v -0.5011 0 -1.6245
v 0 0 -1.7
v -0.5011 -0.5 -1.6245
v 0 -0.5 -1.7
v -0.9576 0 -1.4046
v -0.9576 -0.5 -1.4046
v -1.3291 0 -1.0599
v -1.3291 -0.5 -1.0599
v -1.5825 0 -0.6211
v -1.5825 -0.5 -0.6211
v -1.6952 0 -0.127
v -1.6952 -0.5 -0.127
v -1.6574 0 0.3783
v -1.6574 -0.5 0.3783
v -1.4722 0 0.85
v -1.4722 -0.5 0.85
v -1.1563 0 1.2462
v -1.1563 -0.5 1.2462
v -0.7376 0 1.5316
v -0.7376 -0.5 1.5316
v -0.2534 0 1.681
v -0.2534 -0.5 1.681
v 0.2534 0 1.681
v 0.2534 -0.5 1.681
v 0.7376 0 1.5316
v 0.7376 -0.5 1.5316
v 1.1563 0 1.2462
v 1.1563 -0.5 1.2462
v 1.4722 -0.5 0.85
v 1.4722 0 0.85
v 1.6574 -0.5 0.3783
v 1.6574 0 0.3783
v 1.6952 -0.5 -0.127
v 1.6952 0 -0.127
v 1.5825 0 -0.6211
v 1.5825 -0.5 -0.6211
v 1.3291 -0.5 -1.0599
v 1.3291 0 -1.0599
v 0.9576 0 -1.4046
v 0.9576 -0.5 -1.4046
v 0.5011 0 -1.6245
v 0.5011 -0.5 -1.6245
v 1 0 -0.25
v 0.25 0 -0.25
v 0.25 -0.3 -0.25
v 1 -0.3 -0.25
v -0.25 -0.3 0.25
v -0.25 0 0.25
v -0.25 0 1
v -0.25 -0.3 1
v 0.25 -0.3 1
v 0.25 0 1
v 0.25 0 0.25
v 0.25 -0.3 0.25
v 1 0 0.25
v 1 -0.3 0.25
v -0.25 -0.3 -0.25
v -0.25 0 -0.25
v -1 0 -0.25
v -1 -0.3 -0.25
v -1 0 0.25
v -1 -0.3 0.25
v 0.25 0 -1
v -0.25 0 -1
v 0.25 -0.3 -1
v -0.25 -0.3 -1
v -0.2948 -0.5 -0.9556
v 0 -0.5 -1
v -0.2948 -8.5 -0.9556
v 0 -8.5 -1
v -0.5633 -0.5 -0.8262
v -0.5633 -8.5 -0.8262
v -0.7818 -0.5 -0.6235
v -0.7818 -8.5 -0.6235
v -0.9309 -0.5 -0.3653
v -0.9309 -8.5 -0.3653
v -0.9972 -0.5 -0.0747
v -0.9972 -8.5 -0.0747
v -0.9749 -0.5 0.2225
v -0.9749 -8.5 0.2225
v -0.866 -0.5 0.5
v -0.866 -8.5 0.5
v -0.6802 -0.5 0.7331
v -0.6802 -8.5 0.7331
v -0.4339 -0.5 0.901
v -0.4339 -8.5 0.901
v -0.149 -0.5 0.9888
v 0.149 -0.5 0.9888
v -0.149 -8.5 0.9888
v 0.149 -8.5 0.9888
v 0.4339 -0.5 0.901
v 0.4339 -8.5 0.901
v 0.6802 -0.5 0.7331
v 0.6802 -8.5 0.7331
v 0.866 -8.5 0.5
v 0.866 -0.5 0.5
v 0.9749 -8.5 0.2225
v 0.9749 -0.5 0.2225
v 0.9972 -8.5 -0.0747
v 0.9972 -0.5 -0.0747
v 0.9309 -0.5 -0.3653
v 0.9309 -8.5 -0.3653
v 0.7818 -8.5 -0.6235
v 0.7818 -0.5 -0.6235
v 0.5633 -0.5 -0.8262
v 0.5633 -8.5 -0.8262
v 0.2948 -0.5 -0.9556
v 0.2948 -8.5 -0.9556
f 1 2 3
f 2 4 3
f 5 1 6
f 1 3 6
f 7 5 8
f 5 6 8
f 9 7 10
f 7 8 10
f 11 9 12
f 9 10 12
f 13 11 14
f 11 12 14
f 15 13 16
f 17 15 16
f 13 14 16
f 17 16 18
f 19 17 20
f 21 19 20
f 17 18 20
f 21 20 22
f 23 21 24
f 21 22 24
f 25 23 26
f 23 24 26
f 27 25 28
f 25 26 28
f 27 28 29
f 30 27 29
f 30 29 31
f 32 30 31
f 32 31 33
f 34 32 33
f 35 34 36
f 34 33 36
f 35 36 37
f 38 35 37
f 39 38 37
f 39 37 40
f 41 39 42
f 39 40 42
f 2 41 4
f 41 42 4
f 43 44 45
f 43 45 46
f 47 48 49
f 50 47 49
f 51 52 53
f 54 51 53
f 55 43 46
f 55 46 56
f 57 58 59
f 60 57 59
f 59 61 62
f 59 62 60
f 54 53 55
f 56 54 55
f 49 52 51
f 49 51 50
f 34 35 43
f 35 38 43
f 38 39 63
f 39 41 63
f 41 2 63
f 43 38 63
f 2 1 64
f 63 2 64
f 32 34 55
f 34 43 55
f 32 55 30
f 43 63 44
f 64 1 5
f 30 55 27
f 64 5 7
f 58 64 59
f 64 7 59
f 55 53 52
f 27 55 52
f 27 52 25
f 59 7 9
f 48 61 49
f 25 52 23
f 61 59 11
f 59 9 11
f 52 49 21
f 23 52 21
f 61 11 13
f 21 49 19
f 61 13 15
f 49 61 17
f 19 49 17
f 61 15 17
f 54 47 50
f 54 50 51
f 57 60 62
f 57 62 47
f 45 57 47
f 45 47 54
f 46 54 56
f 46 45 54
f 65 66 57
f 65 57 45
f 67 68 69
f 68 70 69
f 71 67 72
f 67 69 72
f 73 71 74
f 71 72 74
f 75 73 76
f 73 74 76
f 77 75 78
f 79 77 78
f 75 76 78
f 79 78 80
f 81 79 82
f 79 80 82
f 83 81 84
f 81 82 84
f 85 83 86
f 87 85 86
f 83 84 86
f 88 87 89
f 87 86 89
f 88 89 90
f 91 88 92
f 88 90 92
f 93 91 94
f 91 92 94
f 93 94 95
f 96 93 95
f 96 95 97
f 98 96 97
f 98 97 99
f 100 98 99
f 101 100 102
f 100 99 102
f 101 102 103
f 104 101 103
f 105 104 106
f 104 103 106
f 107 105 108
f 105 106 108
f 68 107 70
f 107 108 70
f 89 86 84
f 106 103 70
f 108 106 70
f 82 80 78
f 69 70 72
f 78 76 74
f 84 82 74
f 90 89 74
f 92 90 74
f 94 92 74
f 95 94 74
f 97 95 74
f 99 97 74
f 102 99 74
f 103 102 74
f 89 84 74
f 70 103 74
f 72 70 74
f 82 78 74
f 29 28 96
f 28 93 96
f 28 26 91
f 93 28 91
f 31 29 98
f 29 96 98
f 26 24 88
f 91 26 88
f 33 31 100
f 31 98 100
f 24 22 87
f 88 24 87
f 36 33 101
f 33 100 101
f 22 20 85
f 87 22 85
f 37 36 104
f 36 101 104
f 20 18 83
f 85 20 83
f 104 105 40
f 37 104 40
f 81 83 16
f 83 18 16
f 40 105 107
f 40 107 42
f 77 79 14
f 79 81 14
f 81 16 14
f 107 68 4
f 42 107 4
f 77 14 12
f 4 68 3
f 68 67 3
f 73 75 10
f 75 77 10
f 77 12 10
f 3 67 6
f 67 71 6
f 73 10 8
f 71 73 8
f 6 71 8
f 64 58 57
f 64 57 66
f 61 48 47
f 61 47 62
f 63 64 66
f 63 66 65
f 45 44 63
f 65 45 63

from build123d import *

# Parameters (mm, degrees)
SKETCH_2_W               = 0.5
SKETCH_2_H               = 1
CUT_EXTRUDE_1_DEPTH      = 0.3
PATTERN_CIRCULAR_1_COUNT = 4


with BuildPart() as part:
    # ｽｹｯﾁ1 → 回転1 (revolve)
    with BuildSketch(Plane.XY, mode=Mode.PRIVATE) as revolve_1_sk:
        Polygon((0, 0), (1.7, 0), (1.7, -0.5), (1, -0.5), (1, -8.5), (0, -8.5), align=None)
    revolve(revolve_1_sk.sketch.rotate(Axis((0, -8.5, 0), (0, 1, 0)), 90), axis=Axis((0, -8.5, 0), (0, 1, 0)))

    # ｽｹｯﾁ2 → ｶｯﾄ - 押し出し1 (cut)
    with BuildSketch(Plane(origin=(0, 0, 0), x_dir=(1, 0, 0), z_dir=(0, 1, 0))):
        with Locations((0, 0.5)):
            Rectangle(SKETCH_2_W, SKETCH_2_H)
    cut_extrude_1 = extrude(amount=-CUT_EXTRUDE_1_DEPTH, mode=Mode.SUBTRACT)

    # 円形ﾊﾟﾀｰﾝ1: ｶｯﾄ - 押し出し1 ×4 about axis
    pattern_circular_1_axis = Axis((0, 0, 0), (0, 1, 0))
    for i in range(1, PATTERN_CIRCULAR_1_COUNT):
        add(cut_extrude_1.rotate(pattern_circular_1_axis, i * 360 / PATTERN_CIRCULAR_1_COUNT), mode=Mode.SUBTRACT)


solid = part.part
